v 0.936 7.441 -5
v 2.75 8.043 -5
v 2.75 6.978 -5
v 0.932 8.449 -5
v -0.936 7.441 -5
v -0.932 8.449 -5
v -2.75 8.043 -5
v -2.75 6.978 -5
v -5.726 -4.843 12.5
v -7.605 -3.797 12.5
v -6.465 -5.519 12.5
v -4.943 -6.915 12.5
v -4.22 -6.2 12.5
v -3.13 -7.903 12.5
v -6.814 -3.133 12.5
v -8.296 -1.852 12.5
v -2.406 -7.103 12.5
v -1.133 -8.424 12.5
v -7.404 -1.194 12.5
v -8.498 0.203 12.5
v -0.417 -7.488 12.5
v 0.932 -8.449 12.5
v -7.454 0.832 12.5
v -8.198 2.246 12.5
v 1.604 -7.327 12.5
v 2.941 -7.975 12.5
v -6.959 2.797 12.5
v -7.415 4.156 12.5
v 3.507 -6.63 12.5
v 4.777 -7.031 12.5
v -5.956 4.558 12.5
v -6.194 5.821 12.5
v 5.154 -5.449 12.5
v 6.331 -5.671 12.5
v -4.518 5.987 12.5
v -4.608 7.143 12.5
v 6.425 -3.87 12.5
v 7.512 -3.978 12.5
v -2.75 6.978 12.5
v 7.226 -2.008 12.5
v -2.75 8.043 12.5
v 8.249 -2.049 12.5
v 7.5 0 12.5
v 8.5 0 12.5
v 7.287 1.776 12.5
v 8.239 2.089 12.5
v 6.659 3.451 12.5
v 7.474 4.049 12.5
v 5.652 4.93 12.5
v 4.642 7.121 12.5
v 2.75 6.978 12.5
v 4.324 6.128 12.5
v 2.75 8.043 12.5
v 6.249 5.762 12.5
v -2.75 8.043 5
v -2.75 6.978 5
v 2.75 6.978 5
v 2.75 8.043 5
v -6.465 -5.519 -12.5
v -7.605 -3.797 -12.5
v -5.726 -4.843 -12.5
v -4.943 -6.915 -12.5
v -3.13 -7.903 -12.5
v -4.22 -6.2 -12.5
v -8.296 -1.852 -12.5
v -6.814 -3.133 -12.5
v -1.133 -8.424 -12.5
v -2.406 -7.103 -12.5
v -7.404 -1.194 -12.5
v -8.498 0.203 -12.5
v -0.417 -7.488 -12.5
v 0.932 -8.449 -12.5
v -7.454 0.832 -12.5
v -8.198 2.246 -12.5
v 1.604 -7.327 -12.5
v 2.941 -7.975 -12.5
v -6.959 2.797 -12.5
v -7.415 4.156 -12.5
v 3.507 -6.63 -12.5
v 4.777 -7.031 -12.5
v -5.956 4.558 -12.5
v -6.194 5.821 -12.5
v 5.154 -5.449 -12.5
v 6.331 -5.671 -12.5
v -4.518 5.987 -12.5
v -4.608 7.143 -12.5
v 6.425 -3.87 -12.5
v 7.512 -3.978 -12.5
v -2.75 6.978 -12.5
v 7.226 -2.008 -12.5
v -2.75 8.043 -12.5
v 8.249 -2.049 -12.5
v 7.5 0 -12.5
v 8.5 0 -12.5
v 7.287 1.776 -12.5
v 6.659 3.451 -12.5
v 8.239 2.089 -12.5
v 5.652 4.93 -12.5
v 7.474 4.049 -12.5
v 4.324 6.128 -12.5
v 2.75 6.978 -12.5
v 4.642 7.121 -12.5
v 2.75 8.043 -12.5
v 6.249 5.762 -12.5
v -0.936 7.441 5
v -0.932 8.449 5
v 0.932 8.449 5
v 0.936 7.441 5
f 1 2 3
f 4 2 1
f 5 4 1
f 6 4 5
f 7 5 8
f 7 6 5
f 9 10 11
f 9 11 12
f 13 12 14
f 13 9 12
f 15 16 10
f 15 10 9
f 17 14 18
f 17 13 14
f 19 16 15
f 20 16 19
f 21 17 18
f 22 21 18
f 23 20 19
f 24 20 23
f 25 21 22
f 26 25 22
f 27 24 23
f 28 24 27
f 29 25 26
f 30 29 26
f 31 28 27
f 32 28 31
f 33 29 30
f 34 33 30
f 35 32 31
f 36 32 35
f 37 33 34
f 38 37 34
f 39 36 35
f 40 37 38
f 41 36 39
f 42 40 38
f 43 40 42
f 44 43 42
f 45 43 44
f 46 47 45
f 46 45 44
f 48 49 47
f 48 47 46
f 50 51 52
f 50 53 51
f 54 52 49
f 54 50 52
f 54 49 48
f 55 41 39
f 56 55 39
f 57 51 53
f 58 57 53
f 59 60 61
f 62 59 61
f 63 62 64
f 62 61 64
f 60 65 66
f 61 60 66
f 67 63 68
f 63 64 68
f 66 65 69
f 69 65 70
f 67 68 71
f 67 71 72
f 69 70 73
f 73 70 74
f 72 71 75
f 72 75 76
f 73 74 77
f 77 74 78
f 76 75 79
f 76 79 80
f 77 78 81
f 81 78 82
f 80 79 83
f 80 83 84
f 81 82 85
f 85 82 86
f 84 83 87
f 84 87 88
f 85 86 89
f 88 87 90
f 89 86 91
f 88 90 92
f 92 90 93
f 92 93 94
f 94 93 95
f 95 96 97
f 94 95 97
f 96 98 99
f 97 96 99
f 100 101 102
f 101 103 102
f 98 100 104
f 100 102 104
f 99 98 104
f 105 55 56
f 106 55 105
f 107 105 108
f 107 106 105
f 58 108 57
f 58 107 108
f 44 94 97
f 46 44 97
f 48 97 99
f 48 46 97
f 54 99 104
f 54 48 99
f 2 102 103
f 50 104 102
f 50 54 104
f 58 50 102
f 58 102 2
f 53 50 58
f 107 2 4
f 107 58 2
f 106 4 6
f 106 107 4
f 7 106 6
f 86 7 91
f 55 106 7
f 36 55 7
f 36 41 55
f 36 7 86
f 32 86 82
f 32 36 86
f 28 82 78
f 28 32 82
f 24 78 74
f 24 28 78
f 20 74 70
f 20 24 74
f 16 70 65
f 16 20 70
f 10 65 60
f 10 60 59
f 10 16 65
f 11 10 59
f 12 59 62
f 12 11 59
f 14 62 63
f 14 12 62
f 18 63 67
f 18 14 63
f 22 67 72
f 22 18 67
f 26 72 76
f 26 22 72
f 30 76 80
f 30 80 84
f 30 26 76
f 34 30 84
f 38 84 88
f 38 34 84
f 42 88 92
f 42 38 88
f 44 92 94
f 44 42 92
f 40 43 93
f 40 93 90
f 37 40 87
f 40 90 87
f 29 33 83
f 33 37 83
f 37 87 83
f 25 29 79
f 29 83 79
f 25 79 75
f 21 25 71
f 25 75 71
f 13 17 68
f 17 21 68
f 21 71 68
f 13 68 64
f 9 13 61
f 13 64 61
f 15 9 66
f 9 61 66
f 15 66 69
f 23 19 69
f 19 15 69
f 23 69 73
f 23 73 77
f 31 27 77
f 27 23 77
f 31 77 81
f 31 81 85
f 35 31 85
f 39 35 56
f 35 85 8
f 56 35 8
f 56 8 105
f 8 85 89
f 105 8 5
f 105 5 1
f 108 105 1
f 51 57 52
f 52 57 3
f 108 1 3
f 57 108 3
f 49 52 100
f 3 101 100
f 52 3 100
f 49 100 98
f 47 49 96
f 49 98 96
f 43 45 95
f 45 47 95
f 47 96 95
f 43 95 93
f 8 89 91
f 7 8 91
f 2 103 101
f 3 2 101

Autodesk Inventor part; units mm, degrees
ref_plane "YZ Plane" through (0, 0, 0) normal (1, 0, 0) x (0, 1, 0)
ref_plane "XZ Plane" through (0, 0, 0) normal (0, 1, 0) x (-1, 0, 0)
ref_plane "XY Plane" through (0, 0, 0) normal (0, 0, 1) x (1, 0, 0)
sketch "Sketch1" plane through (0, 0, 0) normal (0, 0, 1) x (1, 0, 0)
  circle A0 centre (0, 0) radius 7.5
  circle A1 centre (0, 0) radius 8.5
  dimension "d0" = 15
  dimension "d1" = 17
extrude "Extrusion1" add sketch "Sketch1" against normal mid plane 25
sketch "Sketch2" plane through (0, 0, 12.5) normal (0, 0, 1) x (1, 0, 0)
  line L0 (-2.75, 9.35) -> (-2.75, 6.9776)
  arc A0 (-2.25, 9.85) -> (-2.75, 9.35) centre (-2.25, 9.35) ccw
  line L1 (2.25, 9.85) -> (-2.25, 9.85)
  arc A1 (2.75, 9.35) -> (2.25, 9.85) centre (2.25, 9.35) ccw
  line L2 (2.75, 6.9776) -> (2.75, 9.35)
  circle A2 centre (0, 0) radius 8.5 projected
  circle A3 centre (0, 0) radius 7.5 projected
  line L3 (-2.75, 6.9776) -> (2.75, 6.9776)
extrude "Extrusion2" cut sketch "Sketch2" against normal blind 7.5 contours A0 L1 A1 L2 A2 L0 | A2 L2 A3 L0 | A3 L3 picked at (1.6937, 7.9533) picked at (-0.4665, 7.1078)
mirror "Mirror1" about plane through (0, 0, 0) normal (0, 0, 1) of "Extrusion2"
properties part number "Pernament magnet" material "Stainless Steel AISI 304"
